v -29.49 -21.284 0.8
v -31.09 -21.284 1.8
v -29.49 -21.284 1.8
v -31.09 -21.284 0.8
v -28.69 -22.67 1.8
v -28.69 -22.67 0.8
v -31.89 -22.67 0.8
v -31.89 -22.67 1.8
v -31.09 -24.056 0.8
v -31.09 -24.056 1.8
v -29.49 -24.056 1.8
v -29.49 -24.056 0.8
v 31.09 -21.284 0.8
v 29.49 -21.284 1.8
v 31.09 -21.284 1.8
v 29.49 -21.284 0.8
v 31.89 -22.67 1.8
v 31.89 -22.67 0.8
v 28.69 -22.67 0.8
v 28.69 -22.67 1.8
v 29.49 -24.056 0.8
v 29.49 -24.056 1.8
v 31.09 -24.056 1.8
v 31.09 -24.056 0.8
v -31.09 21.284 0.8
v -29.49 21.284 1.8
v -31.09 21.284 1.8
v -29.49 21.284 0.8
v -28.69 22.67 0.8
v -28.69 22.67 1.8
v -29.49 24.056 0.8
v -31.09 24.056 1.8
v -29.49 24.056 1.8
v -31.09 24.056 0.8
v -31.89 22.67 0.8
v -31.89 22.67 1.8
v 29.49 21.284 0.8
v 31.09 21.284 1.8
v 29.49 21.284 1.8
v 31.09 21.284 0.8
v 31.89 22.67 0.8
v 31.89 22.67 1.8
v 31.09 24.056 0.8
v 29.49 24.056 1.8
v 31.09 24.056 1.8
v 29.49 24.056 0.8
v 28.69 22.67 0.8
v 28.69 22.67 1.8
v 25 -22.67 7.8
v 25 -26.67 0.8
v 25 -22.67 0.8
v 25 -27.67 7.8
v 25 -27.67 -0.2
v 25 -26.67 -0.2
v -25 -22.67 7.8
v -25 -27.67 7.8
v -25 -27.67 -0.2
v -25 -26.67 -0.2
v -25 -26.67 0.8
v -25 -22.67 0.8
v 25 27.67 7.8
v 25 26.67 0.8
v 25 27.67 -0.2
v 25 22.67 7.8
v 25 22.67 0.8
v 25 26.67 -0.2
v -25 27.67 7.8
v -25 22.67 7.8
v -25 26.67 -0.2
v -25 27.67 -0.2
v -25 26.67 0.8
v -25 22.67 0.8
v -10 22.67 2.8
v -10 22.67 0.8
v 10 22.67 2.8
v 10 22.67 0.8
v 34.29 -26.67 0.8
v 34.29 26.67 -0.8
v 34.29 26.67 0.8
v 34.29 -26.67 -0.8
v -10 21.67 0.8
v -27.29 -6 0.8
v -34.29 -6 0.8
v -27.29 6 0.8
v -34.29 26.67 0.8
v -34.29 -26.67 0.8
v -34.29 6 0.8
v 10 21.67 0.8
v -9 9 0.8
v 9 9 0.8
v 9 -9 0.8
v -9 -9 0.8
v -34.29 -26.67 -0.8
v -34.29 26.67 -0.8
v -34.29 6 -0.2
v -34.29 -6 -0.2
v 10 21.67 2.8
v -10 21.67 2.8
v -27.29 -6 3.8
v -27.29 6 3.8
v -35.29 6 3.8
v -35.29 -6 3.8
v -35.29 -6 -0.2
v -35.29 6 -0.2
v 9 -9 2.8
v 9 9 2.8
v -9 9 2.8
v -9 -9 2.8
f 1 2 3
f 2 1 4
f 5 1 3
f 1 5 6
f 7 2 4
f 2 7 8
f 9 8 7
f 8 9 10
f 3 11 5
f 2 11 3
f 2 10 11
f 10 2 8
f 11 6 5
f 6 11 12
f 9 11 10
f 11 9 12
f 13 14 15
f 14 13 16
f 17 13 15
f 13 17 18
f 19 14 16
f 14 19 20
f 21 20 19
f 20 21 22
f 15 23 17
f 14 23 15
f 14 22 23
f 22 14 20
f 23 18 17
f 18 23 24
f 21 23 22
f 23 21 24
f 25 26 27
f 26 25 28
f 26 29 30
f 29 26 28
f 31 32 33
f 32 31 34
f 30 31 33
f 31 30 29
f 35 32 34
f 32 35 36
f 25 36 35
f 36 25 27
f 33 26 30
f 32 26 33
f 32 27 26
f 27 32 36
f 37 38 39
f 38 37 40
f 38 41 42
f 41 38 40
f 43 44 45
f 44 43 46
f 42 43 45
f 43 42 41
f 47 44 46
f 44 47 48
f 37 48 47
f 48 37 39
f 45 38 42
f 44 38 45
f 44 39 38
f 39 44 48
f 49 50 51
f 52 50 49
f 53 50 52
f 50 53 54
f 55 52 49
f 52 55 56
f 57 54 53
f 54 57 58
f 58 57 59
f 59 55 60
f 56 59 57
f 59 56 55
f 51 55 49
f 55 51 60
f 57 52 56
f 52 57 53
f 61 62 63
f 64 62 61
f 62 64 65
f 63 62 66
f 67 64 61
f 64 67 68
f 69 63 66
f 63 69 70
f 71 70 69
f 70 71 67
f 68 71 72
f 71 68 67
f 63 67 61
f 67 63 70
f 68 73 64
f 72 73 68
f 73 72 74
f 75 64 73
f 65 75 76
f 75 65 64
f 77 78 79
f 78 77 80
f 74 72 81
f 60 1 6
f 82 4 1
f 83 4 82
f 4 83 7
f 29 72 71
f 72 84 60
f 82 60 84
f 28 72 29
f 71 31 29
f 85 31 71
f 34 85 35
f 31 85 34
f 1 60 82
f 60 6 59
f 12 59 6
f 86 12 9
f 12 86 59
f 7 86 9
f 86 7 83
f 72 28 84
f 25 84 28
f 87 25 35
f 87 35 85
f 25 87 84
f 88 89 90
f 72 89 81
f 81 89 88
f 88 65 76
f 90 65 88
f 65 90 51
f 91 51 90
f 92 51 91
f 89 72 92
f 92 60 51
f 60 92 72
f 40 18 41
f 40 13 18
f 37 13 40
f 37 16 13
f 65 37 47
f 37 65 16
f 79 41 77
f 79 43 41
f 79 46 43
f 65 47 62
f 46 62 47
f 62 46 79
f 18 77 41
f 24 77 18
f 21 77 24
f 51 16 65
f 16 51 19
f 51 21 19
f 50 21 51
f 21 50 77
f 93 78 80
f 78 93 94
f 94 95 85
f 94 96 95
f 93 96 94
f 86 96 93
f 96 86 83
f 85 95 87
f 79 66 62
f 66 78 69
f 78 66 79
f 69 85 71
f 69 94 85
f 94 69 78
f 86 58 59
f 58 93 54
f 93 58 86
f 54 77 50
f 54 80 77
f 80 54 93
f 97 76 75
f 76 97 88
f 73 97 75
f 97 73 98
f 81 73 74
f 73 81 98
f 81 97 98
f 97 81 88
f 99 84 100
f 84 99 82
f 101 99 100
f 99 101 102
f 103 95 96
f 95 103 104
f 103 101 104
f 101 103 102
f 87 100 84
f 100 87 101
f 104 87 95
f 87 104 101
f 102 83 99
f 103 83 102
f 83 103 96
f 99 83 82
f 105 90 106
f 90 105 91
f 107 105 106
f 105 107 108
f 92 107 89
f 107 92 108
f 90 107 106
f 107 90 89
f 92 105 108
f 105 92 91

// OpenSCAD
// Parameters
pcb_L = 68.58; //[34.29:137.16:0.01]
pcb_W = 53.34; //[26.67:106.68:0.01]
pcb_T = 1.6; //[0.8:3.2:0.1]
overlap = 1.0; //[0.5:2.0:0.1]
hole_r = 1.6; //[0.8:3.2:0.1]
hole_h = 2.0; //[1.0:6.0:0.1]
hole_edge_margin = 4.0; //[2.0:10.0:0.5]
edge_conn_L = 20.0; //[10.0:40.0:0.5]
edge_conn_W = 6.0; //[3.0:15.0:0.5]
edge_conn_H = 3.0; //[1.5:10.0:0.5]
pin_header_L = 50.0; //[25.0:100.0:0.5]
pin_header_W = 5.0; //[2.5:12.0:0.5]
pin_header_H = 8.0; //[4.0:20.0:0.5]
usb_L = 8.0; //[4.0:20.0:0.5]
usb_W = 12.0; //[6.0:25.0:0.5]
usb_H = 4.0; //[2.0:12.0:0.5]
silk_T = 0.2; //[0.1:0.6:0.05]
silk_margin = 2.0; //[1.0:6.0:0.5]
comp_L = 18.0; //[9.0:40.0:0.5]
comp_W = 18.0; //[9.0:40.0:0.5]
comp_H = 3.0; //[1.5:15.0:0.5]

// Main PCB Body
module pcb_main_body() {
  color([0.0, 0.4, 0.2]) // Green PCB
  cube([pcb_L, pcb_W, pcb_T], center=true);
}

// Mounting Holes
module mounting_holes() {
  color("DimGray") // Placeholder color for holes
  union() {
    translate([-pcb_L/2 + hole_edge_margin, -pcb_W/2 + hole_edge_margin, pcb_T/2 + hole_h/2 - overlap])
      cylinder(r=hole_r, h=hole_h, center=true);
    translate([pcb_L/2 - hole_edge_margin, -pcb_W/2 + hole_edge_margin, pcb_T/2 + hole_h/2 - overlap])
      cylinder(r=hole_r, h=hole_h, center=true);
    translate([-pcb_L/2 + hole_edge_margin, pcb_W/2 - hole_edge_margin, pcb_T/2 + hole_h/2 - overlap])
      cylinder(r=hole_r, h=hole_h, center=true);
    translate([pcb_L/2 - hole_edge_margin, pcb_W/2 - hole_edge_margin, pcb_T/2 + hole_h/2 - overlap])
      cylinder(r=hole_r, h=hole_h, center=true);
  }
}

// Edge Connector Placeholder
module edge_connector_placeholder() {
  color("Silver") // Placeholder color for connectors
  translate([0, pcb_W/2 - edge_conn_W/2 + overlap, pcb_T/2 + edge_conn_H/2 - overlap])
    cube([edge_conn_L, edge_conn_W, edge_conn_H], center=true);
}

// Pin Header Placeholders
module pin_headers() {
  color("Silver") // Placeholder color for pin headers
  union() {
    translate([0, -pcb_W/2 + pin_header_W/2 - overlap, pcb_T/2 + pin_header_H/2 - overlap])
      cube([pin_header_L, pin_header_W, pin_header_H], center=true);
    translate([0, pcb_W/2 - pin_header_W/2 + overlap, pcb_T/2 + pin_header_H/2 - overlap])
      cube([pin_header_L, pin_header_W, pin_header_H], center=true);
  }
}

// USB Connector Placeholder
module usb_connector_placeholder() {
  color("Silver") // Placeholder color for USB connector
  translate([-pcb_L/2 + usb_L/2 - overlap, 0, pcb_T/2 + usb_H/2 - overlap])
    cube([usb_L, usb_W, usb_H], center=true);
}

// Silkscreen Markings
module silkscreen_markings() {
  color("White") // Silkscreen color
  translate([0, 0, pcb_T/2 + silk_T/2 - overlap])
    cube([pcb_L - 2*silk_margin, pcb_W - 2*silk_margin, silk_T], center=true);
}

// Component Placeholders
module component_placeholders() {
  color("Silver") // Placeholder color for components
  translate([0, 0, pcb_T/2 + comp_H/2 - overlap])
    cube([comp_L, comp_W, comp_H], center=true);
}

// Complete Board Model
module complete_board_model() {
  union() {
    pcb_main_body();
    mounting_holes();
    edge_connector_placeholder();
    pin_headers();
    usb_connector_placeholder();
    silkscreen_markings();
    component_placeholders();
  }
}

// Render the complete board model
complete_board_model();
